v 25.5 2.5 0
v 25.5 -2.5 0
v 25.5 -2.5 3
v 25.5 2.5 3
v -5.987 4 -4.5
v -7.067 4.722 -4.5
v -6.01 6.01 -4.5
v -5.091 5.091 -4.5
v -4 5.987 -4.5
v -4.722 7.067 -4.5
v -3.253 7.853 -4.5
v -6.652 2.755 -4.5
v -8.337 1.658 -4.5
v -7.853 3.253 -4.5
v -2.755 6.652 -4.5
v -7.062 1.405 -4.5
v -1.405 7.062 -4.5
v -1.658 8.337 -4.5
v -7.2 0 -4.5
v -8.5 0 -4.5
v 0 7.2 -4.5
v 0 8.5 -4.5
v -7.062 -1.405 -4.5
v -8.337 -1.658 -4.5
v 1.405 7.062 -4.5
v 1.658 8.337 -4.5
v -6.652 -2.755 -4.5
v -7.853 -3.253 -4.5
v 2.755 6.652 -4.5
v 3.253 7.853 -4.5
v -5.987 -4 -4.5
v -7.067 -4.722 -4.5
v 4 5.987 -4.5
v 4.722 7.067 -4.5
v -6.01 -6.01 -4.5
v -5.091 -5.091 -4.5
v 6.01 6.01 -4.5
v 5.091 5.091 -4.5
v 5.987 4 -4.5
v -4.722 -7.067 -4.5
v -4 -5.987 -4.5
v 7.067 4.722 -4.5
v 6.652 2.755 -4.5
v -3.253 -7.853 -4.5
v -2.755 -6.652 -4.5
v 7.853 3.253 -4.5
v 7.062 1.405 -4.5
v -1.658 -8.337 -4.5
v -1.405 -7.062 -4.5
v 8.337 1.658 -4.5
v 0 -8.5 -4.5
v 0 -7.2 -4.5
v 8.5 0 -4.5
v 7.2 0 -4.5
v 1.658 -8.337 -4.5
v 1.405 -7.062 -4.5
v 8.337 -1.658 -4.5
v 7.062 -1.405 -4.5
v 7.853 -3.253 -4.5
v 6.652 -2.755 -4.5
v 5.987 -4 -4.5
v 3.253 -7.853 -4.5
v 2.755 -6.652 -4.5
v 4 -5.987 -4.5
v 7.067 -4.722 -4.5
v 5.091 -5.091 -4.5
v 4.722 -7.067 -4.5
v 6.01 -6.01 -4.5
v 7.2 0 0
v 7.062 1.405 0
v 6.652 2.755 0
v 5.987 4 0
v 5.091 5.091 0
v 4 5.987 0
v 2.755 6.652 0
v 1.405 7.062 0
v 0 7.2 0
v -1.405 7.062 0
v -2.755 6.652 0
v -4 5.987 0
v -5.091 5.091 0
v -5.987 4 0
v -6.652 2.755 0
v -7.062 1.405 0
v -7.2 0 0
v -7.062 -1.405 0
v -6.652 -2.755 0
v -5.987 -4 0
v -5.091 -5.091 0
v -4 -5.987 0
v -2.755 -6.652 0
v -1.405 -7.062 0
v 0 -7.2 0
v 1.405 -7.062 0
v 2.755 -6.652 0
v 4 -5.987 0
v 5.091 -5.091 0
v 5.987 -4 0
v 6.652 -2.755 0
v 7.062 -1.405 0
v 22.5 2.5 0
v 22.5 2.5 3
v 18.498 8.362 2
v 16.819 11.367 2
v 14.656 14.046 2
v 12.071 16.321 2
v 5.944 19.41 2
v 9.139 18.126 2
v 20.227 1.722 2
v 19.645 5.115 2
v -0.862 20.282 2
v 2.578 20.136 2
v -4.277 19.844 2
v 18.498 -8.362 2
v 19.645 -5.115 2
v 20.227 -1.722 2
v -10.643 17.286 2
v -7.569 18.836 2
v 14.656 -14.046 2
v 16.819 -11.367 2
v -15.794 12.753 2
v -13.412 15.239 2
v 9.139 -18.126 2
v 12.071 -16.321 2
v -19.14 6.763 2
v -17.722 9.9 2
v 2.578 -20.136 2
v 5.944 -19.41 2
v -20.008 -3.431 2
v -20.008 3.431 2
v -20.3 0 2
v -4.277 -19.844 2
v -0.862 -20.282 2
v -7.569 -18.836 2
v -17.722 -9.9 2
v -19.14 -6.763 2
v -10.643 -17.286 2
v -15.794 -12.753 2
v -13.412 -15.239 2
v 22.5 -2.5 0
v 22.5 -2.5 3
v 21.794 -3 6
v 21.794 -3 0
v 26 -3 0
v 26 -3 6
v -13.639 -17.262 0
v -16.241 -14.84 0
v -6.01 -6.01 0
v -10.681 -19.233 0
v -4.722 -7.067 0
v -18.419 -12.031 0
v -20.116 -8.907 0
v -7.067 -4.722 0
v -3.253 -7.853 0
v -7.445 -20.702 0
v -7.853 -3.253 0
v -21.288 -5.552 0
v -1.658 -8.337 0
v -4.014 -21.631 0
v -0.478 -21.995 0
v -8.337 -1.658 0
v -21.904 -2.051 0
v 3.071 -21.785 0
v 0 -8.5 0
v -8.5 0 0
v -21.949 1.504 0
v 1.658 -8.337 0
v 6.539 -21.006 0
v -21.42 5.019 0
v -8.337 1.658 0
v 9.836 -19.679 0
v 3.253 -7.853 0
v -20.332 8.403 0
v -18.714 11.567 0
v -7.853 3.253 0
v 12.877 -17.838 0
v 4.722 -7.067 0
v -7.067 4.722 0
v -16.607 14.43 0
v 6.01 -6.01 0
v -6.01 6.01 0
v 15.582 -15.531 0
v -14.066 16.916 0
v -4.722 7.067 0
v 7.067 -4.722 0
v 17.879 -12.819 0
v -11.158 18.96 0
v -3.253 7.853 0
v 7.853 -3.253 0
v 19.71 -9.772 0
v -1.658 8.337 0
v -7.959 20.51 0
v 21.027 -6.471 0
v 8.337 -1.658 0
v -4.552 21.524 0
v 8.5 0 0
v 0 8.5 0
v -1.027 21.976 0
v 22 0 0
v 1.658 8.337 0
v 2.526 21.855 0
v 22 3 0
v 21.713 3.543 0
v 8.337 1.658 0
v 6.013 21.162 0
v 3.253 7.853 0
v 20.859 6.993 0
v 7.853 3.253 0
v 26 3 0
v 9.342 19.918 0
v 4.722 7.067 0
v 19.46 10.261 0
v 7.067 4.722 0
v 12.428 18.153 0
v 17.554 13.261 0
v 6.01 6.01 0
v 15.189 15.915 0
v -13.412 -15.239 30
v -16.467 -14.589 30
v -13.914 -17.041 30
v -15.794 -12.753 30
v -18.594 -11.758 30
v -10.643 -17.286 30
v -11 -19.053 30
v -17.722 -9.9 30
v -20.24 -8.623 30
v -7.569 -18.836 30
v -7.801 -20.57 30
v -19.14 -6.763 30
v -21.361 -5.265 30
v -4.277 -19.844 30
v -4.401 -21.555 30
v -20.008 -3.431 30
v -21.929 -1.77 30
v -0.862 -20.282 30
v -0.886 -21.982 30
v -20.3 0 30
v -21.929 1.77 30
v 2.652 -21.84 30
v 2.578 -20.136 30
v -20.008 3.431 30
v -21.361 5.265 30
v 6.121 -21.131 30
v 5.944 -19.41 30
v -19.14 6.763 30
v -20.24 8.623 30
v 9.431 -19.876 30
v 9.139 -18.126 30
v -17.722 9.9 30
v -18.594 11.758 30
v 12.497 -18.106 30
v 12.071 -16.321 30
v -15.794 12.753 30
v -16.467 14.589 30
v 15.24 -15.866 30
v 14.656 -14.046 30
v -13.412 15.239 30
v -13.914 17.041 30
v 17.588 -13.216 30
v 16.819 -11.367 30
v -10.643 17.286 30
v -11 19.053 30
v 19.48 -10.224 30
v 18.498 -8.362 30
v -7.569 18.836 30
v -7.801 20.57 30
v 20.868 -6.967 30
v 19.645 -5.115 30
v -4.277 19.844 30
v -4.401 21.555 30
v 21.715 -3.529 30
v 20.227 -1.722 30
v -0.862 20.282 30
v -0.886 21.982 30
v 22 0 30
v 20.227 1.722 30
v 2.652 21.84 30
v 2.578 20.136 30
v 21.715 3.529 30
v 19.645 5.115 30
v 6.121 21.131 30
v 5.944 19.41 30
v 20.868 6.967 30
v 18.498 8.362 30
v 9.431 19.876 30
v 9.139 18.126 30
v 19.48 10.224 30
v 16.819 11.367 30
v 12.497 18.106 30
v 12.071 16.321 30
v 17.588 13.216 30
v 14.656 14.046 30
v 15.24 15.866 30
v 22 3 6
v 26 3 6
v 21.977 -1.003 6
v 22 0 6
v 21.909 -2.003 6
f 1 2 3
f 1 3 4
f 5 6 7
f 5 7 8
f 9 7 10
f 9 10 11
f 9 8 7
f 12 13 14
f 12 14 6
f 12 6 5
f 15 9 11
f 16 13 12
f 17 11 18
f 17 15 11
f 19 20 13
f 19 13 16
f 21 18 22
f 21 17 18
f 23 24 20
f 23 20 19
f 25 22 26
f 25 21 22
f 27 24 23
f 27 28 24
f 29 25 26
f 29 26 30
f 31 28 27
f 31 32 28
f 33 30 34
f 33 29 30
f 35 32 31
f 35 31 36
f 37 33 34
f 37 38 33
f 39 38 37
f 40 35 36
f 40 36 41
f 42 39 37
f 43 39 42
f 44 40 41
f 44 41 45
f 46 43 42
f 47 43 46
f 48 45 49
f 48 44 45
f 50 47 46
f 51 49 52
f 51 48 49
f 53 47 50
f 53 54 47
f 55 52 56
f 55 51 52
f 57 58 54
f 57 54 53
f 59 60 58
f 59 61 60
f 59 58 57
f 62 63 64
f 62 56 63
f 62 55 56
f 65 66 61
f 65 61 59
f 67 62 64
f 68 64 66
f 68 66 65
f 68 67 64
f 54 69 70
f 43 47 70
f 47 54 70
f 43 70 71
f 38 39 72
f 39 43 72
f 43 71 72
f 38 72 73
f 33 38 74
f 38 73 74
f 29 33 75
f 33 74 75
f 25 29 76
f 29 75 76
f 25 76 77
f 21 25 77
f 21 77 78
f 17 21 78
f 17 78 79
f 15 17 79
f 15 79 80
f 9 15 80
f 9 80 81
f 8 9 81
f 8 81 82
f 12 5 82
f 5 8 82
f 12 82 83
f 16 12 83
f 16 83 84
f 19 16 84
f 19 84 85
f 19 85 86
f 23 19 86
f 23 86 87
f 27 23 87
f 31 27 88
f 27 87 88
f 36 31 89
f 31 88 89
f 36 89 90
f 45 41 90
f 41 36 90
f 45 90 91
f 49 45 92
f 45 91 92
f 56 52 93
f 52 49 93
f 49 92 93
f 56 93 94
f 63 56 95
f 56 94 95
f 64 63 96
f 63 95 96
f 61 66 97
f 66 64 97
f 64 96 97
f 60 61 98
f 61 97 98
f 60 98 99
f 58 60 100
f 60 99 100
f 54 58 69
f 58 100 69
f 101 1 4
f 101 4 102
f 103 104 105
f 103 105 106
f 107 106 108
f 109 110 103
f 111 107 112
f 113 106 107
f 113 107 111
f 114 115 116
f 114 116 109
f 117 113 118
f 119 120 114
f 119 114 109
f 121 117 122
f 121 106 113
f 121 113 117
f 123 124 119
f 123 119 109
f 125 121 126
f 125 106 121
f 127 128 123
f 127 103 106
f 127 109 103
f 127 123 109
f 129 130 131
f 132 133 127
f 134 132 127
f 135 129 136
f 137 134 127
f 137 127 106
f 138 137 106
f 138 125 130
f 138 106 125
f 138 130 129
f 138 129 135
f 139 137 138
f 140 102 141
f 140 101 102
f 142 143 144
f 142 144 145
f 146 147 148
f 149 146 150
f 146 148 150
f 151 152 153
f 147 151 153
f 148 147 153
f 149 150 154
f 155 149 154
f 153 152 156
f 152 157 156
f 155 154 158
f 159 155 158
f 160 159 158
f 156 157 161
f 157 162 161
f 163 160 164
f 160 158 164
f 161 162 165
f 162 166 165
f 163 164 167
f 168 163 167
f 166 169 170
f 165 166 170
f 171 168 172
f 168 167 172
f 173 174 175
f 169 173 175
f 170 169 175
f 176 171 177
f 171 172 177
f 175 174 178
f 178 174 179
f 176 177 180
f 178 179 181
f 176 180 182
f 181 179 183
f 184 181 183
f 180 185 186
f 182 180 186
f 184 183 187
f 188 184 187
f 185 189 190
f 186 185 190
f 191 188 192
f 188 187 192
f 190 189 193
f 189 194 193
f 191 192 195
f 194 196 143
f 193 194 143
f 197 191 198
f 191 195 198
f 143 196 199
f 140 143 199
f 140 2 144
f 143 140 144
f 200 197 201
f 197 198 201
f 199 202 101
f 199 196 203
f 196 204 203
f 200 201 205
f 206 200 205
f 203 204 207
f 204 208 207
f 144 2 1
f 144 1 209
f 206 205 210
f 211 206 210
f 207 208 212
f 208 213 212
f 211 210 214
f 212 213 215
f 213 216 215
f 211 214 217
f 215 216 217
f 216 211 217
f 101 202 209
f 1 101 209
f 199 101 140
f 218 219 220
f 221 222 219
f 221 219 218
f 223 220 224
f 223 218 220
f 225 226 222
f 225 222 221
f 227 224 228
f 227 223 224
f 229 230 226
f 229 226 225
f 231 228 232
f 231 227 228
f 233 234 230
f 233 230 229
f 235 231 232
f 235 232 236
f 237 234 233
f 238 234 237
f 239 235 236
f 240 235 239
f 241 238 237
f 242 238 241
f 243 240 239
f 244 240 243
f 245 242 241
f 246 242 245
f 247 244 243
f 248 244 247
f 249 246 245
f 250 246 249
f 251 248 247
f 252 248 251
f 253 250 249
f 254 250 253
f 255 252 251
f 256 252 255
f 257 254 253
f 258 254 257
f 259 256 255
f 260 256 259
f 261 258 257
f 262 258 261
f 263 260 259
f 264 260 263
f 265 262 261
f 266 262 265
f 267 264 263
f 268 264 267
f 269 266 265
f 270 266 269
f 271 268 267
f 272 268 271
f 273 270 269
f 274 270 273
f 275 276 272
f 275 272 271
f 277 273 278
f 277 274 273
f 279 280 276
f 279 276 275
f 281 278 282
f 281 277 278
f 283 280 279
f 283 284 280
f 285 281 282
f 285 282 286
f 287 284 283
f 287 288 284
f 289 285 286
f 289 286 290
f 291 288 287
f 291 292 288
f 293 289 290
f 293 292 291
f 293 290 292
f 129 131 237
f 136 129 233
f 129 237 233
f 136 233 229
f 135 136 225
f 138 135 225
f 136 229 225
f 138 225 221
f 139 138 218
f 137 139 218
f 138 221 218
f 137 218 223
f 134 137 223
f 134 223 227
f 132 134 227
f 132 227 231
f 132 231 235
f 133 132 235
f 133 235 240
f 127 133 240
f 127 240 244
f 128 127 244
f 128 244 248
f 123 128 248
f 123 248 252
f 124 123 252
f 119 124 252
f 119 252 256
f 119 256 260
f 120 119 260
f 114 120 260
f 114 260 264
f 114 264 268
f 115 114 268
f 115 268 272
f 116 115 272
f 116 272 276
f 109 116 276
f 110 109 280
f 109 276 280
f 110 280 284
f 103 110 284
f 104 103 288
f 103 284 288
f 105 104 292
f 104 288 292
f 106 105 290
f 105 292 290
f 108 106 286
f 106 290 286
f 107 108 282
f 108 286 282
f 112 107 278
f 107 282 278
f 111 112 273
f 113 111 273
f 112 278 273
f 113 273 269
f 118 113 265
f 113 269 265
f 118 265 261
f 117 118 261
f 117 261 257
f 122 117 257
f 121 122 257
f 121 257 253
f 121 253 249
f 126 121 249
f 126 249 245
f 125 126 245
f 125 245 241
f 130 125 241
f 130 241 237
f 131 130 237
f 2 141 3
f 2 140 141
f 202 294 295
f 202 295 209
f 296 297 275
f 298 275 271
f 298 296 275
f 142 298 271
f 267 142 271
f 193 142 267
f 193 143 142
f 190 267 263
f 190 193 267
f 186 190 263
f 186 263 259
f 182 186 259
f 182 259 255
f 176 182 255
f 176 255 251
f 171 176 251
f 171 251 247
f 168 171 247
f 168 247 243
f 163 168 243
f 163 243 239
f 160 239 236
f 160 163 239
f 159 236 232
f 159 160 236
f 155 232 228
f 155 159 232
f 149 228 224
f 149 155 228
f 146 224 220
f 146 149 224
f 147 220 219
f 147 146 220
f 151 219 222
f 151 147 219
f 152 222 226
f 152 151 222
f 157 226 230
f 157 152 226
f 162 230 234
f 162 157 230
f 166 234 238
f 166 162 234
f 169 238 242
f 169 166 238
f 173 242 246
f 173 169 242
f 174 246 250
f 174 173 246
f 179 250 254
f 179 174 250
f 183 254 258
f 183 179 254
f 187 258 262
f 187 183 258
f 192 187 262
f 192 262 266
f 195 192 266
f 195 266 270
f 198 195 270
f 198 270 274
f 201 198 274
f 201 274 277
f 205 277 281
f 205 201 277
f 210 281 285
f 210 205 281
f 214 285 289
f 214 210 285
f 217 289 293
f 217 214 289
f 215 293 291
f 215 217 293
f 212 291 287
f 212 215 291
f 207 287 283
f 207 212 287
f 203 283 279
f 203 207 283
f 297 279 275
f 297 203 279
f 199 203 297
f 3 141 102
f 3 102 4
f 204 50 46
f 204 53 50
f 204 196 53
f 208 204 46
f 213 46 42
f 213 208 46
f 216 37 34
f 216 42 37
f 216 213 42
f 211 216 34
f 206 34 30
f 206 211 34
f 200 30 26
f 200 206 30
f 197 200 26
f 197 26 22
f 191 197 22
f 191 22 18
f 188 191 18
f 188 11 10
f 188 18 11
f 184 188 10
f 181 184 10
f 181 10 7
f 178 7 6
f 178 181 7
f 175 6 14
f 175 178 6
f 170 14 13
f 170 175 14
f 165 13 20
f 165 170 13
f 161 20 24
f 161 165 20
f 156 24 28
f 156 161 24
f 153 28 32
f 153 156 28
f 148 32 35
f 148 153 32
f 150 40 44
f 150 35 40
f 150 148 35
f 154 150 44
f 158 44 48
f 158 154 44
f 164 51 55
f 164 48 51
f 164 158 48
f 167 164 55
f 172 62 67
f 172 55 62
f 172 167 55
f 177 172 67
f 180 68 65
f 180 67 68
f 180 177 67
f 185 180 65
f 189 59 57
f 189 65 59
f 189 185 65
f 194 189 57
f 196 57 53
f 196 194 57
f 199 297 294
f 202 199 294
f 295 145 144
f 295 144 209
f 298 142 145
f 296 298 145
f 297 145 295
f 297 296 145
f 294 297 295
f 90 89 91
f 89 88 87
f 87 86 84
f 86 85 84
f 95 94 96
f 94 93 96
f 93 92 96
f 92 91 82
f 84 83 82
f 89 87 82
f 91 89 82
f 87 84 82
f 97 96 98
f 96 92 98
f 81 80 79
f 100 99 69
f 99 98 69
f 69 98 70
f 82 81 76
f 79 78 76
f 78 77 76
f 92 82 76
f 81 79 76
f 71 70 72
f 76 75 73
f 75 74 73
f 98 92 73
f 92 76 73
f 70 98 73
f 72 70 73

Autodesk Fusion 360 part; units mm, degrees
sketch "Sketch1" plane through (0, 0, 0) normal (0, 0, 1) x (1, 0, 0)
  circle A0 centre (0, 0) radius 22
  dimension "d1" = 44
extrude "Extrude1" add sketch "Sketch1" along normal blind 30
sketch "Sketch2" plane through (0, 0, 30) normal (0, 0, 1) x (-1, 0, 0)
  circle A0 centre (0, 0) radius 22
  circle A1 centre (0, 0) radius 20.3
  dimension "d4" = 40.6
extrude "Extrude2" cut sketch "Sketch2" against normal blind 28 contours A1
ref_plane "WorkPlane1" through (22, 0, 0) normal (1, 0, 0) x (0, 1, 0)
sketch "Sketch6" plane through (22, 0, 0) normal (1, 0, 0) x (0, 1, 0)
  line L0 (-3, 6) -> (3, 6)
  line L1 (3, 6) -> (3, 0)
  line L2 (3, 0) -> (-3, 0)
  line L3 (-3, 0) -> (-3, 6)
  line L4 (-3, 6) -> (3, 0) construction
  line L5 (3, 6) -> (-3, 0) construction
  point P0 (0, 3)
  dimension "d15" = 6
  dimension "d16" = 6
extrude "Extrude5" add sketch "Sketch6" along normal blind 4 and the other way up to surface second end surface at (21.8907, -2.1905, 20)
sketch "Sketch7" plane through (0, 0, 0) normal (0, 0, -1) x (1, 0, 0)
  line L0 (21.7945, -3) -> (26, -3)
  line L1 (26, -3) -> (26, 3)
  line L2 (26, 3) -> (21.7945, 3)
  line L3 (25.5, -2.5) -> (22.5, -2.5)
  line L4 (22.5, -2.5) -> (22.5, 2.5)
  line L5 (22.5, 2.5) -> (25.5, 2.5)
  line L6 (25.5, 2.5) -> (25.5, -2.5)
  line L7 (25.5, -2.5) -> (22.5, 2.5) construction
  line L8 (22.5, -2.5) -> (25.5, 2.5) construction
  arc A0 (21.7945, 3) -> (21.7945, -3) centre (0, 0) ccw
  point P0 (24, 0)
  dimension "d19" = 3
  dimension "d20" = 5
extrude "Extrude6" cut sketch "Sketch7" against normal blind 3 contours L3 L4 L5 L6
sketch "Sketch8" plane through (0, 0, 0) normal (0, 0, -1) x (1, 0, 0)
  line L0 (22.5, -2.5) -> (22.5, 2.5)
  line L1 (22.5, 2.5) -> (25.5, 2.5)
  line L2 (25.5, 2.5) -> (25.5, -2.5)
  line L3 (25.5, -2.5) -> (22.5, -2.5)
  arc A0 (21.7945, 3) -> (21.7945, -3) centre (0, 0) ccw
  line L4 (21.7945, -3) -> (26, -3)
  line L5 (26, -3) -> (26, 3)
  line L6 (26, 3) -> (21.7945, 3)
  circle A1 centre (0, 0) radius 8.5
  circle A2 centre (0, 0) radius 7.2
  dimension "d25" = 17
  dimension "d26" = 14.4
extrude "Extrude7" add sketch "Sketch8" along normal blind 4.5 contours A1
